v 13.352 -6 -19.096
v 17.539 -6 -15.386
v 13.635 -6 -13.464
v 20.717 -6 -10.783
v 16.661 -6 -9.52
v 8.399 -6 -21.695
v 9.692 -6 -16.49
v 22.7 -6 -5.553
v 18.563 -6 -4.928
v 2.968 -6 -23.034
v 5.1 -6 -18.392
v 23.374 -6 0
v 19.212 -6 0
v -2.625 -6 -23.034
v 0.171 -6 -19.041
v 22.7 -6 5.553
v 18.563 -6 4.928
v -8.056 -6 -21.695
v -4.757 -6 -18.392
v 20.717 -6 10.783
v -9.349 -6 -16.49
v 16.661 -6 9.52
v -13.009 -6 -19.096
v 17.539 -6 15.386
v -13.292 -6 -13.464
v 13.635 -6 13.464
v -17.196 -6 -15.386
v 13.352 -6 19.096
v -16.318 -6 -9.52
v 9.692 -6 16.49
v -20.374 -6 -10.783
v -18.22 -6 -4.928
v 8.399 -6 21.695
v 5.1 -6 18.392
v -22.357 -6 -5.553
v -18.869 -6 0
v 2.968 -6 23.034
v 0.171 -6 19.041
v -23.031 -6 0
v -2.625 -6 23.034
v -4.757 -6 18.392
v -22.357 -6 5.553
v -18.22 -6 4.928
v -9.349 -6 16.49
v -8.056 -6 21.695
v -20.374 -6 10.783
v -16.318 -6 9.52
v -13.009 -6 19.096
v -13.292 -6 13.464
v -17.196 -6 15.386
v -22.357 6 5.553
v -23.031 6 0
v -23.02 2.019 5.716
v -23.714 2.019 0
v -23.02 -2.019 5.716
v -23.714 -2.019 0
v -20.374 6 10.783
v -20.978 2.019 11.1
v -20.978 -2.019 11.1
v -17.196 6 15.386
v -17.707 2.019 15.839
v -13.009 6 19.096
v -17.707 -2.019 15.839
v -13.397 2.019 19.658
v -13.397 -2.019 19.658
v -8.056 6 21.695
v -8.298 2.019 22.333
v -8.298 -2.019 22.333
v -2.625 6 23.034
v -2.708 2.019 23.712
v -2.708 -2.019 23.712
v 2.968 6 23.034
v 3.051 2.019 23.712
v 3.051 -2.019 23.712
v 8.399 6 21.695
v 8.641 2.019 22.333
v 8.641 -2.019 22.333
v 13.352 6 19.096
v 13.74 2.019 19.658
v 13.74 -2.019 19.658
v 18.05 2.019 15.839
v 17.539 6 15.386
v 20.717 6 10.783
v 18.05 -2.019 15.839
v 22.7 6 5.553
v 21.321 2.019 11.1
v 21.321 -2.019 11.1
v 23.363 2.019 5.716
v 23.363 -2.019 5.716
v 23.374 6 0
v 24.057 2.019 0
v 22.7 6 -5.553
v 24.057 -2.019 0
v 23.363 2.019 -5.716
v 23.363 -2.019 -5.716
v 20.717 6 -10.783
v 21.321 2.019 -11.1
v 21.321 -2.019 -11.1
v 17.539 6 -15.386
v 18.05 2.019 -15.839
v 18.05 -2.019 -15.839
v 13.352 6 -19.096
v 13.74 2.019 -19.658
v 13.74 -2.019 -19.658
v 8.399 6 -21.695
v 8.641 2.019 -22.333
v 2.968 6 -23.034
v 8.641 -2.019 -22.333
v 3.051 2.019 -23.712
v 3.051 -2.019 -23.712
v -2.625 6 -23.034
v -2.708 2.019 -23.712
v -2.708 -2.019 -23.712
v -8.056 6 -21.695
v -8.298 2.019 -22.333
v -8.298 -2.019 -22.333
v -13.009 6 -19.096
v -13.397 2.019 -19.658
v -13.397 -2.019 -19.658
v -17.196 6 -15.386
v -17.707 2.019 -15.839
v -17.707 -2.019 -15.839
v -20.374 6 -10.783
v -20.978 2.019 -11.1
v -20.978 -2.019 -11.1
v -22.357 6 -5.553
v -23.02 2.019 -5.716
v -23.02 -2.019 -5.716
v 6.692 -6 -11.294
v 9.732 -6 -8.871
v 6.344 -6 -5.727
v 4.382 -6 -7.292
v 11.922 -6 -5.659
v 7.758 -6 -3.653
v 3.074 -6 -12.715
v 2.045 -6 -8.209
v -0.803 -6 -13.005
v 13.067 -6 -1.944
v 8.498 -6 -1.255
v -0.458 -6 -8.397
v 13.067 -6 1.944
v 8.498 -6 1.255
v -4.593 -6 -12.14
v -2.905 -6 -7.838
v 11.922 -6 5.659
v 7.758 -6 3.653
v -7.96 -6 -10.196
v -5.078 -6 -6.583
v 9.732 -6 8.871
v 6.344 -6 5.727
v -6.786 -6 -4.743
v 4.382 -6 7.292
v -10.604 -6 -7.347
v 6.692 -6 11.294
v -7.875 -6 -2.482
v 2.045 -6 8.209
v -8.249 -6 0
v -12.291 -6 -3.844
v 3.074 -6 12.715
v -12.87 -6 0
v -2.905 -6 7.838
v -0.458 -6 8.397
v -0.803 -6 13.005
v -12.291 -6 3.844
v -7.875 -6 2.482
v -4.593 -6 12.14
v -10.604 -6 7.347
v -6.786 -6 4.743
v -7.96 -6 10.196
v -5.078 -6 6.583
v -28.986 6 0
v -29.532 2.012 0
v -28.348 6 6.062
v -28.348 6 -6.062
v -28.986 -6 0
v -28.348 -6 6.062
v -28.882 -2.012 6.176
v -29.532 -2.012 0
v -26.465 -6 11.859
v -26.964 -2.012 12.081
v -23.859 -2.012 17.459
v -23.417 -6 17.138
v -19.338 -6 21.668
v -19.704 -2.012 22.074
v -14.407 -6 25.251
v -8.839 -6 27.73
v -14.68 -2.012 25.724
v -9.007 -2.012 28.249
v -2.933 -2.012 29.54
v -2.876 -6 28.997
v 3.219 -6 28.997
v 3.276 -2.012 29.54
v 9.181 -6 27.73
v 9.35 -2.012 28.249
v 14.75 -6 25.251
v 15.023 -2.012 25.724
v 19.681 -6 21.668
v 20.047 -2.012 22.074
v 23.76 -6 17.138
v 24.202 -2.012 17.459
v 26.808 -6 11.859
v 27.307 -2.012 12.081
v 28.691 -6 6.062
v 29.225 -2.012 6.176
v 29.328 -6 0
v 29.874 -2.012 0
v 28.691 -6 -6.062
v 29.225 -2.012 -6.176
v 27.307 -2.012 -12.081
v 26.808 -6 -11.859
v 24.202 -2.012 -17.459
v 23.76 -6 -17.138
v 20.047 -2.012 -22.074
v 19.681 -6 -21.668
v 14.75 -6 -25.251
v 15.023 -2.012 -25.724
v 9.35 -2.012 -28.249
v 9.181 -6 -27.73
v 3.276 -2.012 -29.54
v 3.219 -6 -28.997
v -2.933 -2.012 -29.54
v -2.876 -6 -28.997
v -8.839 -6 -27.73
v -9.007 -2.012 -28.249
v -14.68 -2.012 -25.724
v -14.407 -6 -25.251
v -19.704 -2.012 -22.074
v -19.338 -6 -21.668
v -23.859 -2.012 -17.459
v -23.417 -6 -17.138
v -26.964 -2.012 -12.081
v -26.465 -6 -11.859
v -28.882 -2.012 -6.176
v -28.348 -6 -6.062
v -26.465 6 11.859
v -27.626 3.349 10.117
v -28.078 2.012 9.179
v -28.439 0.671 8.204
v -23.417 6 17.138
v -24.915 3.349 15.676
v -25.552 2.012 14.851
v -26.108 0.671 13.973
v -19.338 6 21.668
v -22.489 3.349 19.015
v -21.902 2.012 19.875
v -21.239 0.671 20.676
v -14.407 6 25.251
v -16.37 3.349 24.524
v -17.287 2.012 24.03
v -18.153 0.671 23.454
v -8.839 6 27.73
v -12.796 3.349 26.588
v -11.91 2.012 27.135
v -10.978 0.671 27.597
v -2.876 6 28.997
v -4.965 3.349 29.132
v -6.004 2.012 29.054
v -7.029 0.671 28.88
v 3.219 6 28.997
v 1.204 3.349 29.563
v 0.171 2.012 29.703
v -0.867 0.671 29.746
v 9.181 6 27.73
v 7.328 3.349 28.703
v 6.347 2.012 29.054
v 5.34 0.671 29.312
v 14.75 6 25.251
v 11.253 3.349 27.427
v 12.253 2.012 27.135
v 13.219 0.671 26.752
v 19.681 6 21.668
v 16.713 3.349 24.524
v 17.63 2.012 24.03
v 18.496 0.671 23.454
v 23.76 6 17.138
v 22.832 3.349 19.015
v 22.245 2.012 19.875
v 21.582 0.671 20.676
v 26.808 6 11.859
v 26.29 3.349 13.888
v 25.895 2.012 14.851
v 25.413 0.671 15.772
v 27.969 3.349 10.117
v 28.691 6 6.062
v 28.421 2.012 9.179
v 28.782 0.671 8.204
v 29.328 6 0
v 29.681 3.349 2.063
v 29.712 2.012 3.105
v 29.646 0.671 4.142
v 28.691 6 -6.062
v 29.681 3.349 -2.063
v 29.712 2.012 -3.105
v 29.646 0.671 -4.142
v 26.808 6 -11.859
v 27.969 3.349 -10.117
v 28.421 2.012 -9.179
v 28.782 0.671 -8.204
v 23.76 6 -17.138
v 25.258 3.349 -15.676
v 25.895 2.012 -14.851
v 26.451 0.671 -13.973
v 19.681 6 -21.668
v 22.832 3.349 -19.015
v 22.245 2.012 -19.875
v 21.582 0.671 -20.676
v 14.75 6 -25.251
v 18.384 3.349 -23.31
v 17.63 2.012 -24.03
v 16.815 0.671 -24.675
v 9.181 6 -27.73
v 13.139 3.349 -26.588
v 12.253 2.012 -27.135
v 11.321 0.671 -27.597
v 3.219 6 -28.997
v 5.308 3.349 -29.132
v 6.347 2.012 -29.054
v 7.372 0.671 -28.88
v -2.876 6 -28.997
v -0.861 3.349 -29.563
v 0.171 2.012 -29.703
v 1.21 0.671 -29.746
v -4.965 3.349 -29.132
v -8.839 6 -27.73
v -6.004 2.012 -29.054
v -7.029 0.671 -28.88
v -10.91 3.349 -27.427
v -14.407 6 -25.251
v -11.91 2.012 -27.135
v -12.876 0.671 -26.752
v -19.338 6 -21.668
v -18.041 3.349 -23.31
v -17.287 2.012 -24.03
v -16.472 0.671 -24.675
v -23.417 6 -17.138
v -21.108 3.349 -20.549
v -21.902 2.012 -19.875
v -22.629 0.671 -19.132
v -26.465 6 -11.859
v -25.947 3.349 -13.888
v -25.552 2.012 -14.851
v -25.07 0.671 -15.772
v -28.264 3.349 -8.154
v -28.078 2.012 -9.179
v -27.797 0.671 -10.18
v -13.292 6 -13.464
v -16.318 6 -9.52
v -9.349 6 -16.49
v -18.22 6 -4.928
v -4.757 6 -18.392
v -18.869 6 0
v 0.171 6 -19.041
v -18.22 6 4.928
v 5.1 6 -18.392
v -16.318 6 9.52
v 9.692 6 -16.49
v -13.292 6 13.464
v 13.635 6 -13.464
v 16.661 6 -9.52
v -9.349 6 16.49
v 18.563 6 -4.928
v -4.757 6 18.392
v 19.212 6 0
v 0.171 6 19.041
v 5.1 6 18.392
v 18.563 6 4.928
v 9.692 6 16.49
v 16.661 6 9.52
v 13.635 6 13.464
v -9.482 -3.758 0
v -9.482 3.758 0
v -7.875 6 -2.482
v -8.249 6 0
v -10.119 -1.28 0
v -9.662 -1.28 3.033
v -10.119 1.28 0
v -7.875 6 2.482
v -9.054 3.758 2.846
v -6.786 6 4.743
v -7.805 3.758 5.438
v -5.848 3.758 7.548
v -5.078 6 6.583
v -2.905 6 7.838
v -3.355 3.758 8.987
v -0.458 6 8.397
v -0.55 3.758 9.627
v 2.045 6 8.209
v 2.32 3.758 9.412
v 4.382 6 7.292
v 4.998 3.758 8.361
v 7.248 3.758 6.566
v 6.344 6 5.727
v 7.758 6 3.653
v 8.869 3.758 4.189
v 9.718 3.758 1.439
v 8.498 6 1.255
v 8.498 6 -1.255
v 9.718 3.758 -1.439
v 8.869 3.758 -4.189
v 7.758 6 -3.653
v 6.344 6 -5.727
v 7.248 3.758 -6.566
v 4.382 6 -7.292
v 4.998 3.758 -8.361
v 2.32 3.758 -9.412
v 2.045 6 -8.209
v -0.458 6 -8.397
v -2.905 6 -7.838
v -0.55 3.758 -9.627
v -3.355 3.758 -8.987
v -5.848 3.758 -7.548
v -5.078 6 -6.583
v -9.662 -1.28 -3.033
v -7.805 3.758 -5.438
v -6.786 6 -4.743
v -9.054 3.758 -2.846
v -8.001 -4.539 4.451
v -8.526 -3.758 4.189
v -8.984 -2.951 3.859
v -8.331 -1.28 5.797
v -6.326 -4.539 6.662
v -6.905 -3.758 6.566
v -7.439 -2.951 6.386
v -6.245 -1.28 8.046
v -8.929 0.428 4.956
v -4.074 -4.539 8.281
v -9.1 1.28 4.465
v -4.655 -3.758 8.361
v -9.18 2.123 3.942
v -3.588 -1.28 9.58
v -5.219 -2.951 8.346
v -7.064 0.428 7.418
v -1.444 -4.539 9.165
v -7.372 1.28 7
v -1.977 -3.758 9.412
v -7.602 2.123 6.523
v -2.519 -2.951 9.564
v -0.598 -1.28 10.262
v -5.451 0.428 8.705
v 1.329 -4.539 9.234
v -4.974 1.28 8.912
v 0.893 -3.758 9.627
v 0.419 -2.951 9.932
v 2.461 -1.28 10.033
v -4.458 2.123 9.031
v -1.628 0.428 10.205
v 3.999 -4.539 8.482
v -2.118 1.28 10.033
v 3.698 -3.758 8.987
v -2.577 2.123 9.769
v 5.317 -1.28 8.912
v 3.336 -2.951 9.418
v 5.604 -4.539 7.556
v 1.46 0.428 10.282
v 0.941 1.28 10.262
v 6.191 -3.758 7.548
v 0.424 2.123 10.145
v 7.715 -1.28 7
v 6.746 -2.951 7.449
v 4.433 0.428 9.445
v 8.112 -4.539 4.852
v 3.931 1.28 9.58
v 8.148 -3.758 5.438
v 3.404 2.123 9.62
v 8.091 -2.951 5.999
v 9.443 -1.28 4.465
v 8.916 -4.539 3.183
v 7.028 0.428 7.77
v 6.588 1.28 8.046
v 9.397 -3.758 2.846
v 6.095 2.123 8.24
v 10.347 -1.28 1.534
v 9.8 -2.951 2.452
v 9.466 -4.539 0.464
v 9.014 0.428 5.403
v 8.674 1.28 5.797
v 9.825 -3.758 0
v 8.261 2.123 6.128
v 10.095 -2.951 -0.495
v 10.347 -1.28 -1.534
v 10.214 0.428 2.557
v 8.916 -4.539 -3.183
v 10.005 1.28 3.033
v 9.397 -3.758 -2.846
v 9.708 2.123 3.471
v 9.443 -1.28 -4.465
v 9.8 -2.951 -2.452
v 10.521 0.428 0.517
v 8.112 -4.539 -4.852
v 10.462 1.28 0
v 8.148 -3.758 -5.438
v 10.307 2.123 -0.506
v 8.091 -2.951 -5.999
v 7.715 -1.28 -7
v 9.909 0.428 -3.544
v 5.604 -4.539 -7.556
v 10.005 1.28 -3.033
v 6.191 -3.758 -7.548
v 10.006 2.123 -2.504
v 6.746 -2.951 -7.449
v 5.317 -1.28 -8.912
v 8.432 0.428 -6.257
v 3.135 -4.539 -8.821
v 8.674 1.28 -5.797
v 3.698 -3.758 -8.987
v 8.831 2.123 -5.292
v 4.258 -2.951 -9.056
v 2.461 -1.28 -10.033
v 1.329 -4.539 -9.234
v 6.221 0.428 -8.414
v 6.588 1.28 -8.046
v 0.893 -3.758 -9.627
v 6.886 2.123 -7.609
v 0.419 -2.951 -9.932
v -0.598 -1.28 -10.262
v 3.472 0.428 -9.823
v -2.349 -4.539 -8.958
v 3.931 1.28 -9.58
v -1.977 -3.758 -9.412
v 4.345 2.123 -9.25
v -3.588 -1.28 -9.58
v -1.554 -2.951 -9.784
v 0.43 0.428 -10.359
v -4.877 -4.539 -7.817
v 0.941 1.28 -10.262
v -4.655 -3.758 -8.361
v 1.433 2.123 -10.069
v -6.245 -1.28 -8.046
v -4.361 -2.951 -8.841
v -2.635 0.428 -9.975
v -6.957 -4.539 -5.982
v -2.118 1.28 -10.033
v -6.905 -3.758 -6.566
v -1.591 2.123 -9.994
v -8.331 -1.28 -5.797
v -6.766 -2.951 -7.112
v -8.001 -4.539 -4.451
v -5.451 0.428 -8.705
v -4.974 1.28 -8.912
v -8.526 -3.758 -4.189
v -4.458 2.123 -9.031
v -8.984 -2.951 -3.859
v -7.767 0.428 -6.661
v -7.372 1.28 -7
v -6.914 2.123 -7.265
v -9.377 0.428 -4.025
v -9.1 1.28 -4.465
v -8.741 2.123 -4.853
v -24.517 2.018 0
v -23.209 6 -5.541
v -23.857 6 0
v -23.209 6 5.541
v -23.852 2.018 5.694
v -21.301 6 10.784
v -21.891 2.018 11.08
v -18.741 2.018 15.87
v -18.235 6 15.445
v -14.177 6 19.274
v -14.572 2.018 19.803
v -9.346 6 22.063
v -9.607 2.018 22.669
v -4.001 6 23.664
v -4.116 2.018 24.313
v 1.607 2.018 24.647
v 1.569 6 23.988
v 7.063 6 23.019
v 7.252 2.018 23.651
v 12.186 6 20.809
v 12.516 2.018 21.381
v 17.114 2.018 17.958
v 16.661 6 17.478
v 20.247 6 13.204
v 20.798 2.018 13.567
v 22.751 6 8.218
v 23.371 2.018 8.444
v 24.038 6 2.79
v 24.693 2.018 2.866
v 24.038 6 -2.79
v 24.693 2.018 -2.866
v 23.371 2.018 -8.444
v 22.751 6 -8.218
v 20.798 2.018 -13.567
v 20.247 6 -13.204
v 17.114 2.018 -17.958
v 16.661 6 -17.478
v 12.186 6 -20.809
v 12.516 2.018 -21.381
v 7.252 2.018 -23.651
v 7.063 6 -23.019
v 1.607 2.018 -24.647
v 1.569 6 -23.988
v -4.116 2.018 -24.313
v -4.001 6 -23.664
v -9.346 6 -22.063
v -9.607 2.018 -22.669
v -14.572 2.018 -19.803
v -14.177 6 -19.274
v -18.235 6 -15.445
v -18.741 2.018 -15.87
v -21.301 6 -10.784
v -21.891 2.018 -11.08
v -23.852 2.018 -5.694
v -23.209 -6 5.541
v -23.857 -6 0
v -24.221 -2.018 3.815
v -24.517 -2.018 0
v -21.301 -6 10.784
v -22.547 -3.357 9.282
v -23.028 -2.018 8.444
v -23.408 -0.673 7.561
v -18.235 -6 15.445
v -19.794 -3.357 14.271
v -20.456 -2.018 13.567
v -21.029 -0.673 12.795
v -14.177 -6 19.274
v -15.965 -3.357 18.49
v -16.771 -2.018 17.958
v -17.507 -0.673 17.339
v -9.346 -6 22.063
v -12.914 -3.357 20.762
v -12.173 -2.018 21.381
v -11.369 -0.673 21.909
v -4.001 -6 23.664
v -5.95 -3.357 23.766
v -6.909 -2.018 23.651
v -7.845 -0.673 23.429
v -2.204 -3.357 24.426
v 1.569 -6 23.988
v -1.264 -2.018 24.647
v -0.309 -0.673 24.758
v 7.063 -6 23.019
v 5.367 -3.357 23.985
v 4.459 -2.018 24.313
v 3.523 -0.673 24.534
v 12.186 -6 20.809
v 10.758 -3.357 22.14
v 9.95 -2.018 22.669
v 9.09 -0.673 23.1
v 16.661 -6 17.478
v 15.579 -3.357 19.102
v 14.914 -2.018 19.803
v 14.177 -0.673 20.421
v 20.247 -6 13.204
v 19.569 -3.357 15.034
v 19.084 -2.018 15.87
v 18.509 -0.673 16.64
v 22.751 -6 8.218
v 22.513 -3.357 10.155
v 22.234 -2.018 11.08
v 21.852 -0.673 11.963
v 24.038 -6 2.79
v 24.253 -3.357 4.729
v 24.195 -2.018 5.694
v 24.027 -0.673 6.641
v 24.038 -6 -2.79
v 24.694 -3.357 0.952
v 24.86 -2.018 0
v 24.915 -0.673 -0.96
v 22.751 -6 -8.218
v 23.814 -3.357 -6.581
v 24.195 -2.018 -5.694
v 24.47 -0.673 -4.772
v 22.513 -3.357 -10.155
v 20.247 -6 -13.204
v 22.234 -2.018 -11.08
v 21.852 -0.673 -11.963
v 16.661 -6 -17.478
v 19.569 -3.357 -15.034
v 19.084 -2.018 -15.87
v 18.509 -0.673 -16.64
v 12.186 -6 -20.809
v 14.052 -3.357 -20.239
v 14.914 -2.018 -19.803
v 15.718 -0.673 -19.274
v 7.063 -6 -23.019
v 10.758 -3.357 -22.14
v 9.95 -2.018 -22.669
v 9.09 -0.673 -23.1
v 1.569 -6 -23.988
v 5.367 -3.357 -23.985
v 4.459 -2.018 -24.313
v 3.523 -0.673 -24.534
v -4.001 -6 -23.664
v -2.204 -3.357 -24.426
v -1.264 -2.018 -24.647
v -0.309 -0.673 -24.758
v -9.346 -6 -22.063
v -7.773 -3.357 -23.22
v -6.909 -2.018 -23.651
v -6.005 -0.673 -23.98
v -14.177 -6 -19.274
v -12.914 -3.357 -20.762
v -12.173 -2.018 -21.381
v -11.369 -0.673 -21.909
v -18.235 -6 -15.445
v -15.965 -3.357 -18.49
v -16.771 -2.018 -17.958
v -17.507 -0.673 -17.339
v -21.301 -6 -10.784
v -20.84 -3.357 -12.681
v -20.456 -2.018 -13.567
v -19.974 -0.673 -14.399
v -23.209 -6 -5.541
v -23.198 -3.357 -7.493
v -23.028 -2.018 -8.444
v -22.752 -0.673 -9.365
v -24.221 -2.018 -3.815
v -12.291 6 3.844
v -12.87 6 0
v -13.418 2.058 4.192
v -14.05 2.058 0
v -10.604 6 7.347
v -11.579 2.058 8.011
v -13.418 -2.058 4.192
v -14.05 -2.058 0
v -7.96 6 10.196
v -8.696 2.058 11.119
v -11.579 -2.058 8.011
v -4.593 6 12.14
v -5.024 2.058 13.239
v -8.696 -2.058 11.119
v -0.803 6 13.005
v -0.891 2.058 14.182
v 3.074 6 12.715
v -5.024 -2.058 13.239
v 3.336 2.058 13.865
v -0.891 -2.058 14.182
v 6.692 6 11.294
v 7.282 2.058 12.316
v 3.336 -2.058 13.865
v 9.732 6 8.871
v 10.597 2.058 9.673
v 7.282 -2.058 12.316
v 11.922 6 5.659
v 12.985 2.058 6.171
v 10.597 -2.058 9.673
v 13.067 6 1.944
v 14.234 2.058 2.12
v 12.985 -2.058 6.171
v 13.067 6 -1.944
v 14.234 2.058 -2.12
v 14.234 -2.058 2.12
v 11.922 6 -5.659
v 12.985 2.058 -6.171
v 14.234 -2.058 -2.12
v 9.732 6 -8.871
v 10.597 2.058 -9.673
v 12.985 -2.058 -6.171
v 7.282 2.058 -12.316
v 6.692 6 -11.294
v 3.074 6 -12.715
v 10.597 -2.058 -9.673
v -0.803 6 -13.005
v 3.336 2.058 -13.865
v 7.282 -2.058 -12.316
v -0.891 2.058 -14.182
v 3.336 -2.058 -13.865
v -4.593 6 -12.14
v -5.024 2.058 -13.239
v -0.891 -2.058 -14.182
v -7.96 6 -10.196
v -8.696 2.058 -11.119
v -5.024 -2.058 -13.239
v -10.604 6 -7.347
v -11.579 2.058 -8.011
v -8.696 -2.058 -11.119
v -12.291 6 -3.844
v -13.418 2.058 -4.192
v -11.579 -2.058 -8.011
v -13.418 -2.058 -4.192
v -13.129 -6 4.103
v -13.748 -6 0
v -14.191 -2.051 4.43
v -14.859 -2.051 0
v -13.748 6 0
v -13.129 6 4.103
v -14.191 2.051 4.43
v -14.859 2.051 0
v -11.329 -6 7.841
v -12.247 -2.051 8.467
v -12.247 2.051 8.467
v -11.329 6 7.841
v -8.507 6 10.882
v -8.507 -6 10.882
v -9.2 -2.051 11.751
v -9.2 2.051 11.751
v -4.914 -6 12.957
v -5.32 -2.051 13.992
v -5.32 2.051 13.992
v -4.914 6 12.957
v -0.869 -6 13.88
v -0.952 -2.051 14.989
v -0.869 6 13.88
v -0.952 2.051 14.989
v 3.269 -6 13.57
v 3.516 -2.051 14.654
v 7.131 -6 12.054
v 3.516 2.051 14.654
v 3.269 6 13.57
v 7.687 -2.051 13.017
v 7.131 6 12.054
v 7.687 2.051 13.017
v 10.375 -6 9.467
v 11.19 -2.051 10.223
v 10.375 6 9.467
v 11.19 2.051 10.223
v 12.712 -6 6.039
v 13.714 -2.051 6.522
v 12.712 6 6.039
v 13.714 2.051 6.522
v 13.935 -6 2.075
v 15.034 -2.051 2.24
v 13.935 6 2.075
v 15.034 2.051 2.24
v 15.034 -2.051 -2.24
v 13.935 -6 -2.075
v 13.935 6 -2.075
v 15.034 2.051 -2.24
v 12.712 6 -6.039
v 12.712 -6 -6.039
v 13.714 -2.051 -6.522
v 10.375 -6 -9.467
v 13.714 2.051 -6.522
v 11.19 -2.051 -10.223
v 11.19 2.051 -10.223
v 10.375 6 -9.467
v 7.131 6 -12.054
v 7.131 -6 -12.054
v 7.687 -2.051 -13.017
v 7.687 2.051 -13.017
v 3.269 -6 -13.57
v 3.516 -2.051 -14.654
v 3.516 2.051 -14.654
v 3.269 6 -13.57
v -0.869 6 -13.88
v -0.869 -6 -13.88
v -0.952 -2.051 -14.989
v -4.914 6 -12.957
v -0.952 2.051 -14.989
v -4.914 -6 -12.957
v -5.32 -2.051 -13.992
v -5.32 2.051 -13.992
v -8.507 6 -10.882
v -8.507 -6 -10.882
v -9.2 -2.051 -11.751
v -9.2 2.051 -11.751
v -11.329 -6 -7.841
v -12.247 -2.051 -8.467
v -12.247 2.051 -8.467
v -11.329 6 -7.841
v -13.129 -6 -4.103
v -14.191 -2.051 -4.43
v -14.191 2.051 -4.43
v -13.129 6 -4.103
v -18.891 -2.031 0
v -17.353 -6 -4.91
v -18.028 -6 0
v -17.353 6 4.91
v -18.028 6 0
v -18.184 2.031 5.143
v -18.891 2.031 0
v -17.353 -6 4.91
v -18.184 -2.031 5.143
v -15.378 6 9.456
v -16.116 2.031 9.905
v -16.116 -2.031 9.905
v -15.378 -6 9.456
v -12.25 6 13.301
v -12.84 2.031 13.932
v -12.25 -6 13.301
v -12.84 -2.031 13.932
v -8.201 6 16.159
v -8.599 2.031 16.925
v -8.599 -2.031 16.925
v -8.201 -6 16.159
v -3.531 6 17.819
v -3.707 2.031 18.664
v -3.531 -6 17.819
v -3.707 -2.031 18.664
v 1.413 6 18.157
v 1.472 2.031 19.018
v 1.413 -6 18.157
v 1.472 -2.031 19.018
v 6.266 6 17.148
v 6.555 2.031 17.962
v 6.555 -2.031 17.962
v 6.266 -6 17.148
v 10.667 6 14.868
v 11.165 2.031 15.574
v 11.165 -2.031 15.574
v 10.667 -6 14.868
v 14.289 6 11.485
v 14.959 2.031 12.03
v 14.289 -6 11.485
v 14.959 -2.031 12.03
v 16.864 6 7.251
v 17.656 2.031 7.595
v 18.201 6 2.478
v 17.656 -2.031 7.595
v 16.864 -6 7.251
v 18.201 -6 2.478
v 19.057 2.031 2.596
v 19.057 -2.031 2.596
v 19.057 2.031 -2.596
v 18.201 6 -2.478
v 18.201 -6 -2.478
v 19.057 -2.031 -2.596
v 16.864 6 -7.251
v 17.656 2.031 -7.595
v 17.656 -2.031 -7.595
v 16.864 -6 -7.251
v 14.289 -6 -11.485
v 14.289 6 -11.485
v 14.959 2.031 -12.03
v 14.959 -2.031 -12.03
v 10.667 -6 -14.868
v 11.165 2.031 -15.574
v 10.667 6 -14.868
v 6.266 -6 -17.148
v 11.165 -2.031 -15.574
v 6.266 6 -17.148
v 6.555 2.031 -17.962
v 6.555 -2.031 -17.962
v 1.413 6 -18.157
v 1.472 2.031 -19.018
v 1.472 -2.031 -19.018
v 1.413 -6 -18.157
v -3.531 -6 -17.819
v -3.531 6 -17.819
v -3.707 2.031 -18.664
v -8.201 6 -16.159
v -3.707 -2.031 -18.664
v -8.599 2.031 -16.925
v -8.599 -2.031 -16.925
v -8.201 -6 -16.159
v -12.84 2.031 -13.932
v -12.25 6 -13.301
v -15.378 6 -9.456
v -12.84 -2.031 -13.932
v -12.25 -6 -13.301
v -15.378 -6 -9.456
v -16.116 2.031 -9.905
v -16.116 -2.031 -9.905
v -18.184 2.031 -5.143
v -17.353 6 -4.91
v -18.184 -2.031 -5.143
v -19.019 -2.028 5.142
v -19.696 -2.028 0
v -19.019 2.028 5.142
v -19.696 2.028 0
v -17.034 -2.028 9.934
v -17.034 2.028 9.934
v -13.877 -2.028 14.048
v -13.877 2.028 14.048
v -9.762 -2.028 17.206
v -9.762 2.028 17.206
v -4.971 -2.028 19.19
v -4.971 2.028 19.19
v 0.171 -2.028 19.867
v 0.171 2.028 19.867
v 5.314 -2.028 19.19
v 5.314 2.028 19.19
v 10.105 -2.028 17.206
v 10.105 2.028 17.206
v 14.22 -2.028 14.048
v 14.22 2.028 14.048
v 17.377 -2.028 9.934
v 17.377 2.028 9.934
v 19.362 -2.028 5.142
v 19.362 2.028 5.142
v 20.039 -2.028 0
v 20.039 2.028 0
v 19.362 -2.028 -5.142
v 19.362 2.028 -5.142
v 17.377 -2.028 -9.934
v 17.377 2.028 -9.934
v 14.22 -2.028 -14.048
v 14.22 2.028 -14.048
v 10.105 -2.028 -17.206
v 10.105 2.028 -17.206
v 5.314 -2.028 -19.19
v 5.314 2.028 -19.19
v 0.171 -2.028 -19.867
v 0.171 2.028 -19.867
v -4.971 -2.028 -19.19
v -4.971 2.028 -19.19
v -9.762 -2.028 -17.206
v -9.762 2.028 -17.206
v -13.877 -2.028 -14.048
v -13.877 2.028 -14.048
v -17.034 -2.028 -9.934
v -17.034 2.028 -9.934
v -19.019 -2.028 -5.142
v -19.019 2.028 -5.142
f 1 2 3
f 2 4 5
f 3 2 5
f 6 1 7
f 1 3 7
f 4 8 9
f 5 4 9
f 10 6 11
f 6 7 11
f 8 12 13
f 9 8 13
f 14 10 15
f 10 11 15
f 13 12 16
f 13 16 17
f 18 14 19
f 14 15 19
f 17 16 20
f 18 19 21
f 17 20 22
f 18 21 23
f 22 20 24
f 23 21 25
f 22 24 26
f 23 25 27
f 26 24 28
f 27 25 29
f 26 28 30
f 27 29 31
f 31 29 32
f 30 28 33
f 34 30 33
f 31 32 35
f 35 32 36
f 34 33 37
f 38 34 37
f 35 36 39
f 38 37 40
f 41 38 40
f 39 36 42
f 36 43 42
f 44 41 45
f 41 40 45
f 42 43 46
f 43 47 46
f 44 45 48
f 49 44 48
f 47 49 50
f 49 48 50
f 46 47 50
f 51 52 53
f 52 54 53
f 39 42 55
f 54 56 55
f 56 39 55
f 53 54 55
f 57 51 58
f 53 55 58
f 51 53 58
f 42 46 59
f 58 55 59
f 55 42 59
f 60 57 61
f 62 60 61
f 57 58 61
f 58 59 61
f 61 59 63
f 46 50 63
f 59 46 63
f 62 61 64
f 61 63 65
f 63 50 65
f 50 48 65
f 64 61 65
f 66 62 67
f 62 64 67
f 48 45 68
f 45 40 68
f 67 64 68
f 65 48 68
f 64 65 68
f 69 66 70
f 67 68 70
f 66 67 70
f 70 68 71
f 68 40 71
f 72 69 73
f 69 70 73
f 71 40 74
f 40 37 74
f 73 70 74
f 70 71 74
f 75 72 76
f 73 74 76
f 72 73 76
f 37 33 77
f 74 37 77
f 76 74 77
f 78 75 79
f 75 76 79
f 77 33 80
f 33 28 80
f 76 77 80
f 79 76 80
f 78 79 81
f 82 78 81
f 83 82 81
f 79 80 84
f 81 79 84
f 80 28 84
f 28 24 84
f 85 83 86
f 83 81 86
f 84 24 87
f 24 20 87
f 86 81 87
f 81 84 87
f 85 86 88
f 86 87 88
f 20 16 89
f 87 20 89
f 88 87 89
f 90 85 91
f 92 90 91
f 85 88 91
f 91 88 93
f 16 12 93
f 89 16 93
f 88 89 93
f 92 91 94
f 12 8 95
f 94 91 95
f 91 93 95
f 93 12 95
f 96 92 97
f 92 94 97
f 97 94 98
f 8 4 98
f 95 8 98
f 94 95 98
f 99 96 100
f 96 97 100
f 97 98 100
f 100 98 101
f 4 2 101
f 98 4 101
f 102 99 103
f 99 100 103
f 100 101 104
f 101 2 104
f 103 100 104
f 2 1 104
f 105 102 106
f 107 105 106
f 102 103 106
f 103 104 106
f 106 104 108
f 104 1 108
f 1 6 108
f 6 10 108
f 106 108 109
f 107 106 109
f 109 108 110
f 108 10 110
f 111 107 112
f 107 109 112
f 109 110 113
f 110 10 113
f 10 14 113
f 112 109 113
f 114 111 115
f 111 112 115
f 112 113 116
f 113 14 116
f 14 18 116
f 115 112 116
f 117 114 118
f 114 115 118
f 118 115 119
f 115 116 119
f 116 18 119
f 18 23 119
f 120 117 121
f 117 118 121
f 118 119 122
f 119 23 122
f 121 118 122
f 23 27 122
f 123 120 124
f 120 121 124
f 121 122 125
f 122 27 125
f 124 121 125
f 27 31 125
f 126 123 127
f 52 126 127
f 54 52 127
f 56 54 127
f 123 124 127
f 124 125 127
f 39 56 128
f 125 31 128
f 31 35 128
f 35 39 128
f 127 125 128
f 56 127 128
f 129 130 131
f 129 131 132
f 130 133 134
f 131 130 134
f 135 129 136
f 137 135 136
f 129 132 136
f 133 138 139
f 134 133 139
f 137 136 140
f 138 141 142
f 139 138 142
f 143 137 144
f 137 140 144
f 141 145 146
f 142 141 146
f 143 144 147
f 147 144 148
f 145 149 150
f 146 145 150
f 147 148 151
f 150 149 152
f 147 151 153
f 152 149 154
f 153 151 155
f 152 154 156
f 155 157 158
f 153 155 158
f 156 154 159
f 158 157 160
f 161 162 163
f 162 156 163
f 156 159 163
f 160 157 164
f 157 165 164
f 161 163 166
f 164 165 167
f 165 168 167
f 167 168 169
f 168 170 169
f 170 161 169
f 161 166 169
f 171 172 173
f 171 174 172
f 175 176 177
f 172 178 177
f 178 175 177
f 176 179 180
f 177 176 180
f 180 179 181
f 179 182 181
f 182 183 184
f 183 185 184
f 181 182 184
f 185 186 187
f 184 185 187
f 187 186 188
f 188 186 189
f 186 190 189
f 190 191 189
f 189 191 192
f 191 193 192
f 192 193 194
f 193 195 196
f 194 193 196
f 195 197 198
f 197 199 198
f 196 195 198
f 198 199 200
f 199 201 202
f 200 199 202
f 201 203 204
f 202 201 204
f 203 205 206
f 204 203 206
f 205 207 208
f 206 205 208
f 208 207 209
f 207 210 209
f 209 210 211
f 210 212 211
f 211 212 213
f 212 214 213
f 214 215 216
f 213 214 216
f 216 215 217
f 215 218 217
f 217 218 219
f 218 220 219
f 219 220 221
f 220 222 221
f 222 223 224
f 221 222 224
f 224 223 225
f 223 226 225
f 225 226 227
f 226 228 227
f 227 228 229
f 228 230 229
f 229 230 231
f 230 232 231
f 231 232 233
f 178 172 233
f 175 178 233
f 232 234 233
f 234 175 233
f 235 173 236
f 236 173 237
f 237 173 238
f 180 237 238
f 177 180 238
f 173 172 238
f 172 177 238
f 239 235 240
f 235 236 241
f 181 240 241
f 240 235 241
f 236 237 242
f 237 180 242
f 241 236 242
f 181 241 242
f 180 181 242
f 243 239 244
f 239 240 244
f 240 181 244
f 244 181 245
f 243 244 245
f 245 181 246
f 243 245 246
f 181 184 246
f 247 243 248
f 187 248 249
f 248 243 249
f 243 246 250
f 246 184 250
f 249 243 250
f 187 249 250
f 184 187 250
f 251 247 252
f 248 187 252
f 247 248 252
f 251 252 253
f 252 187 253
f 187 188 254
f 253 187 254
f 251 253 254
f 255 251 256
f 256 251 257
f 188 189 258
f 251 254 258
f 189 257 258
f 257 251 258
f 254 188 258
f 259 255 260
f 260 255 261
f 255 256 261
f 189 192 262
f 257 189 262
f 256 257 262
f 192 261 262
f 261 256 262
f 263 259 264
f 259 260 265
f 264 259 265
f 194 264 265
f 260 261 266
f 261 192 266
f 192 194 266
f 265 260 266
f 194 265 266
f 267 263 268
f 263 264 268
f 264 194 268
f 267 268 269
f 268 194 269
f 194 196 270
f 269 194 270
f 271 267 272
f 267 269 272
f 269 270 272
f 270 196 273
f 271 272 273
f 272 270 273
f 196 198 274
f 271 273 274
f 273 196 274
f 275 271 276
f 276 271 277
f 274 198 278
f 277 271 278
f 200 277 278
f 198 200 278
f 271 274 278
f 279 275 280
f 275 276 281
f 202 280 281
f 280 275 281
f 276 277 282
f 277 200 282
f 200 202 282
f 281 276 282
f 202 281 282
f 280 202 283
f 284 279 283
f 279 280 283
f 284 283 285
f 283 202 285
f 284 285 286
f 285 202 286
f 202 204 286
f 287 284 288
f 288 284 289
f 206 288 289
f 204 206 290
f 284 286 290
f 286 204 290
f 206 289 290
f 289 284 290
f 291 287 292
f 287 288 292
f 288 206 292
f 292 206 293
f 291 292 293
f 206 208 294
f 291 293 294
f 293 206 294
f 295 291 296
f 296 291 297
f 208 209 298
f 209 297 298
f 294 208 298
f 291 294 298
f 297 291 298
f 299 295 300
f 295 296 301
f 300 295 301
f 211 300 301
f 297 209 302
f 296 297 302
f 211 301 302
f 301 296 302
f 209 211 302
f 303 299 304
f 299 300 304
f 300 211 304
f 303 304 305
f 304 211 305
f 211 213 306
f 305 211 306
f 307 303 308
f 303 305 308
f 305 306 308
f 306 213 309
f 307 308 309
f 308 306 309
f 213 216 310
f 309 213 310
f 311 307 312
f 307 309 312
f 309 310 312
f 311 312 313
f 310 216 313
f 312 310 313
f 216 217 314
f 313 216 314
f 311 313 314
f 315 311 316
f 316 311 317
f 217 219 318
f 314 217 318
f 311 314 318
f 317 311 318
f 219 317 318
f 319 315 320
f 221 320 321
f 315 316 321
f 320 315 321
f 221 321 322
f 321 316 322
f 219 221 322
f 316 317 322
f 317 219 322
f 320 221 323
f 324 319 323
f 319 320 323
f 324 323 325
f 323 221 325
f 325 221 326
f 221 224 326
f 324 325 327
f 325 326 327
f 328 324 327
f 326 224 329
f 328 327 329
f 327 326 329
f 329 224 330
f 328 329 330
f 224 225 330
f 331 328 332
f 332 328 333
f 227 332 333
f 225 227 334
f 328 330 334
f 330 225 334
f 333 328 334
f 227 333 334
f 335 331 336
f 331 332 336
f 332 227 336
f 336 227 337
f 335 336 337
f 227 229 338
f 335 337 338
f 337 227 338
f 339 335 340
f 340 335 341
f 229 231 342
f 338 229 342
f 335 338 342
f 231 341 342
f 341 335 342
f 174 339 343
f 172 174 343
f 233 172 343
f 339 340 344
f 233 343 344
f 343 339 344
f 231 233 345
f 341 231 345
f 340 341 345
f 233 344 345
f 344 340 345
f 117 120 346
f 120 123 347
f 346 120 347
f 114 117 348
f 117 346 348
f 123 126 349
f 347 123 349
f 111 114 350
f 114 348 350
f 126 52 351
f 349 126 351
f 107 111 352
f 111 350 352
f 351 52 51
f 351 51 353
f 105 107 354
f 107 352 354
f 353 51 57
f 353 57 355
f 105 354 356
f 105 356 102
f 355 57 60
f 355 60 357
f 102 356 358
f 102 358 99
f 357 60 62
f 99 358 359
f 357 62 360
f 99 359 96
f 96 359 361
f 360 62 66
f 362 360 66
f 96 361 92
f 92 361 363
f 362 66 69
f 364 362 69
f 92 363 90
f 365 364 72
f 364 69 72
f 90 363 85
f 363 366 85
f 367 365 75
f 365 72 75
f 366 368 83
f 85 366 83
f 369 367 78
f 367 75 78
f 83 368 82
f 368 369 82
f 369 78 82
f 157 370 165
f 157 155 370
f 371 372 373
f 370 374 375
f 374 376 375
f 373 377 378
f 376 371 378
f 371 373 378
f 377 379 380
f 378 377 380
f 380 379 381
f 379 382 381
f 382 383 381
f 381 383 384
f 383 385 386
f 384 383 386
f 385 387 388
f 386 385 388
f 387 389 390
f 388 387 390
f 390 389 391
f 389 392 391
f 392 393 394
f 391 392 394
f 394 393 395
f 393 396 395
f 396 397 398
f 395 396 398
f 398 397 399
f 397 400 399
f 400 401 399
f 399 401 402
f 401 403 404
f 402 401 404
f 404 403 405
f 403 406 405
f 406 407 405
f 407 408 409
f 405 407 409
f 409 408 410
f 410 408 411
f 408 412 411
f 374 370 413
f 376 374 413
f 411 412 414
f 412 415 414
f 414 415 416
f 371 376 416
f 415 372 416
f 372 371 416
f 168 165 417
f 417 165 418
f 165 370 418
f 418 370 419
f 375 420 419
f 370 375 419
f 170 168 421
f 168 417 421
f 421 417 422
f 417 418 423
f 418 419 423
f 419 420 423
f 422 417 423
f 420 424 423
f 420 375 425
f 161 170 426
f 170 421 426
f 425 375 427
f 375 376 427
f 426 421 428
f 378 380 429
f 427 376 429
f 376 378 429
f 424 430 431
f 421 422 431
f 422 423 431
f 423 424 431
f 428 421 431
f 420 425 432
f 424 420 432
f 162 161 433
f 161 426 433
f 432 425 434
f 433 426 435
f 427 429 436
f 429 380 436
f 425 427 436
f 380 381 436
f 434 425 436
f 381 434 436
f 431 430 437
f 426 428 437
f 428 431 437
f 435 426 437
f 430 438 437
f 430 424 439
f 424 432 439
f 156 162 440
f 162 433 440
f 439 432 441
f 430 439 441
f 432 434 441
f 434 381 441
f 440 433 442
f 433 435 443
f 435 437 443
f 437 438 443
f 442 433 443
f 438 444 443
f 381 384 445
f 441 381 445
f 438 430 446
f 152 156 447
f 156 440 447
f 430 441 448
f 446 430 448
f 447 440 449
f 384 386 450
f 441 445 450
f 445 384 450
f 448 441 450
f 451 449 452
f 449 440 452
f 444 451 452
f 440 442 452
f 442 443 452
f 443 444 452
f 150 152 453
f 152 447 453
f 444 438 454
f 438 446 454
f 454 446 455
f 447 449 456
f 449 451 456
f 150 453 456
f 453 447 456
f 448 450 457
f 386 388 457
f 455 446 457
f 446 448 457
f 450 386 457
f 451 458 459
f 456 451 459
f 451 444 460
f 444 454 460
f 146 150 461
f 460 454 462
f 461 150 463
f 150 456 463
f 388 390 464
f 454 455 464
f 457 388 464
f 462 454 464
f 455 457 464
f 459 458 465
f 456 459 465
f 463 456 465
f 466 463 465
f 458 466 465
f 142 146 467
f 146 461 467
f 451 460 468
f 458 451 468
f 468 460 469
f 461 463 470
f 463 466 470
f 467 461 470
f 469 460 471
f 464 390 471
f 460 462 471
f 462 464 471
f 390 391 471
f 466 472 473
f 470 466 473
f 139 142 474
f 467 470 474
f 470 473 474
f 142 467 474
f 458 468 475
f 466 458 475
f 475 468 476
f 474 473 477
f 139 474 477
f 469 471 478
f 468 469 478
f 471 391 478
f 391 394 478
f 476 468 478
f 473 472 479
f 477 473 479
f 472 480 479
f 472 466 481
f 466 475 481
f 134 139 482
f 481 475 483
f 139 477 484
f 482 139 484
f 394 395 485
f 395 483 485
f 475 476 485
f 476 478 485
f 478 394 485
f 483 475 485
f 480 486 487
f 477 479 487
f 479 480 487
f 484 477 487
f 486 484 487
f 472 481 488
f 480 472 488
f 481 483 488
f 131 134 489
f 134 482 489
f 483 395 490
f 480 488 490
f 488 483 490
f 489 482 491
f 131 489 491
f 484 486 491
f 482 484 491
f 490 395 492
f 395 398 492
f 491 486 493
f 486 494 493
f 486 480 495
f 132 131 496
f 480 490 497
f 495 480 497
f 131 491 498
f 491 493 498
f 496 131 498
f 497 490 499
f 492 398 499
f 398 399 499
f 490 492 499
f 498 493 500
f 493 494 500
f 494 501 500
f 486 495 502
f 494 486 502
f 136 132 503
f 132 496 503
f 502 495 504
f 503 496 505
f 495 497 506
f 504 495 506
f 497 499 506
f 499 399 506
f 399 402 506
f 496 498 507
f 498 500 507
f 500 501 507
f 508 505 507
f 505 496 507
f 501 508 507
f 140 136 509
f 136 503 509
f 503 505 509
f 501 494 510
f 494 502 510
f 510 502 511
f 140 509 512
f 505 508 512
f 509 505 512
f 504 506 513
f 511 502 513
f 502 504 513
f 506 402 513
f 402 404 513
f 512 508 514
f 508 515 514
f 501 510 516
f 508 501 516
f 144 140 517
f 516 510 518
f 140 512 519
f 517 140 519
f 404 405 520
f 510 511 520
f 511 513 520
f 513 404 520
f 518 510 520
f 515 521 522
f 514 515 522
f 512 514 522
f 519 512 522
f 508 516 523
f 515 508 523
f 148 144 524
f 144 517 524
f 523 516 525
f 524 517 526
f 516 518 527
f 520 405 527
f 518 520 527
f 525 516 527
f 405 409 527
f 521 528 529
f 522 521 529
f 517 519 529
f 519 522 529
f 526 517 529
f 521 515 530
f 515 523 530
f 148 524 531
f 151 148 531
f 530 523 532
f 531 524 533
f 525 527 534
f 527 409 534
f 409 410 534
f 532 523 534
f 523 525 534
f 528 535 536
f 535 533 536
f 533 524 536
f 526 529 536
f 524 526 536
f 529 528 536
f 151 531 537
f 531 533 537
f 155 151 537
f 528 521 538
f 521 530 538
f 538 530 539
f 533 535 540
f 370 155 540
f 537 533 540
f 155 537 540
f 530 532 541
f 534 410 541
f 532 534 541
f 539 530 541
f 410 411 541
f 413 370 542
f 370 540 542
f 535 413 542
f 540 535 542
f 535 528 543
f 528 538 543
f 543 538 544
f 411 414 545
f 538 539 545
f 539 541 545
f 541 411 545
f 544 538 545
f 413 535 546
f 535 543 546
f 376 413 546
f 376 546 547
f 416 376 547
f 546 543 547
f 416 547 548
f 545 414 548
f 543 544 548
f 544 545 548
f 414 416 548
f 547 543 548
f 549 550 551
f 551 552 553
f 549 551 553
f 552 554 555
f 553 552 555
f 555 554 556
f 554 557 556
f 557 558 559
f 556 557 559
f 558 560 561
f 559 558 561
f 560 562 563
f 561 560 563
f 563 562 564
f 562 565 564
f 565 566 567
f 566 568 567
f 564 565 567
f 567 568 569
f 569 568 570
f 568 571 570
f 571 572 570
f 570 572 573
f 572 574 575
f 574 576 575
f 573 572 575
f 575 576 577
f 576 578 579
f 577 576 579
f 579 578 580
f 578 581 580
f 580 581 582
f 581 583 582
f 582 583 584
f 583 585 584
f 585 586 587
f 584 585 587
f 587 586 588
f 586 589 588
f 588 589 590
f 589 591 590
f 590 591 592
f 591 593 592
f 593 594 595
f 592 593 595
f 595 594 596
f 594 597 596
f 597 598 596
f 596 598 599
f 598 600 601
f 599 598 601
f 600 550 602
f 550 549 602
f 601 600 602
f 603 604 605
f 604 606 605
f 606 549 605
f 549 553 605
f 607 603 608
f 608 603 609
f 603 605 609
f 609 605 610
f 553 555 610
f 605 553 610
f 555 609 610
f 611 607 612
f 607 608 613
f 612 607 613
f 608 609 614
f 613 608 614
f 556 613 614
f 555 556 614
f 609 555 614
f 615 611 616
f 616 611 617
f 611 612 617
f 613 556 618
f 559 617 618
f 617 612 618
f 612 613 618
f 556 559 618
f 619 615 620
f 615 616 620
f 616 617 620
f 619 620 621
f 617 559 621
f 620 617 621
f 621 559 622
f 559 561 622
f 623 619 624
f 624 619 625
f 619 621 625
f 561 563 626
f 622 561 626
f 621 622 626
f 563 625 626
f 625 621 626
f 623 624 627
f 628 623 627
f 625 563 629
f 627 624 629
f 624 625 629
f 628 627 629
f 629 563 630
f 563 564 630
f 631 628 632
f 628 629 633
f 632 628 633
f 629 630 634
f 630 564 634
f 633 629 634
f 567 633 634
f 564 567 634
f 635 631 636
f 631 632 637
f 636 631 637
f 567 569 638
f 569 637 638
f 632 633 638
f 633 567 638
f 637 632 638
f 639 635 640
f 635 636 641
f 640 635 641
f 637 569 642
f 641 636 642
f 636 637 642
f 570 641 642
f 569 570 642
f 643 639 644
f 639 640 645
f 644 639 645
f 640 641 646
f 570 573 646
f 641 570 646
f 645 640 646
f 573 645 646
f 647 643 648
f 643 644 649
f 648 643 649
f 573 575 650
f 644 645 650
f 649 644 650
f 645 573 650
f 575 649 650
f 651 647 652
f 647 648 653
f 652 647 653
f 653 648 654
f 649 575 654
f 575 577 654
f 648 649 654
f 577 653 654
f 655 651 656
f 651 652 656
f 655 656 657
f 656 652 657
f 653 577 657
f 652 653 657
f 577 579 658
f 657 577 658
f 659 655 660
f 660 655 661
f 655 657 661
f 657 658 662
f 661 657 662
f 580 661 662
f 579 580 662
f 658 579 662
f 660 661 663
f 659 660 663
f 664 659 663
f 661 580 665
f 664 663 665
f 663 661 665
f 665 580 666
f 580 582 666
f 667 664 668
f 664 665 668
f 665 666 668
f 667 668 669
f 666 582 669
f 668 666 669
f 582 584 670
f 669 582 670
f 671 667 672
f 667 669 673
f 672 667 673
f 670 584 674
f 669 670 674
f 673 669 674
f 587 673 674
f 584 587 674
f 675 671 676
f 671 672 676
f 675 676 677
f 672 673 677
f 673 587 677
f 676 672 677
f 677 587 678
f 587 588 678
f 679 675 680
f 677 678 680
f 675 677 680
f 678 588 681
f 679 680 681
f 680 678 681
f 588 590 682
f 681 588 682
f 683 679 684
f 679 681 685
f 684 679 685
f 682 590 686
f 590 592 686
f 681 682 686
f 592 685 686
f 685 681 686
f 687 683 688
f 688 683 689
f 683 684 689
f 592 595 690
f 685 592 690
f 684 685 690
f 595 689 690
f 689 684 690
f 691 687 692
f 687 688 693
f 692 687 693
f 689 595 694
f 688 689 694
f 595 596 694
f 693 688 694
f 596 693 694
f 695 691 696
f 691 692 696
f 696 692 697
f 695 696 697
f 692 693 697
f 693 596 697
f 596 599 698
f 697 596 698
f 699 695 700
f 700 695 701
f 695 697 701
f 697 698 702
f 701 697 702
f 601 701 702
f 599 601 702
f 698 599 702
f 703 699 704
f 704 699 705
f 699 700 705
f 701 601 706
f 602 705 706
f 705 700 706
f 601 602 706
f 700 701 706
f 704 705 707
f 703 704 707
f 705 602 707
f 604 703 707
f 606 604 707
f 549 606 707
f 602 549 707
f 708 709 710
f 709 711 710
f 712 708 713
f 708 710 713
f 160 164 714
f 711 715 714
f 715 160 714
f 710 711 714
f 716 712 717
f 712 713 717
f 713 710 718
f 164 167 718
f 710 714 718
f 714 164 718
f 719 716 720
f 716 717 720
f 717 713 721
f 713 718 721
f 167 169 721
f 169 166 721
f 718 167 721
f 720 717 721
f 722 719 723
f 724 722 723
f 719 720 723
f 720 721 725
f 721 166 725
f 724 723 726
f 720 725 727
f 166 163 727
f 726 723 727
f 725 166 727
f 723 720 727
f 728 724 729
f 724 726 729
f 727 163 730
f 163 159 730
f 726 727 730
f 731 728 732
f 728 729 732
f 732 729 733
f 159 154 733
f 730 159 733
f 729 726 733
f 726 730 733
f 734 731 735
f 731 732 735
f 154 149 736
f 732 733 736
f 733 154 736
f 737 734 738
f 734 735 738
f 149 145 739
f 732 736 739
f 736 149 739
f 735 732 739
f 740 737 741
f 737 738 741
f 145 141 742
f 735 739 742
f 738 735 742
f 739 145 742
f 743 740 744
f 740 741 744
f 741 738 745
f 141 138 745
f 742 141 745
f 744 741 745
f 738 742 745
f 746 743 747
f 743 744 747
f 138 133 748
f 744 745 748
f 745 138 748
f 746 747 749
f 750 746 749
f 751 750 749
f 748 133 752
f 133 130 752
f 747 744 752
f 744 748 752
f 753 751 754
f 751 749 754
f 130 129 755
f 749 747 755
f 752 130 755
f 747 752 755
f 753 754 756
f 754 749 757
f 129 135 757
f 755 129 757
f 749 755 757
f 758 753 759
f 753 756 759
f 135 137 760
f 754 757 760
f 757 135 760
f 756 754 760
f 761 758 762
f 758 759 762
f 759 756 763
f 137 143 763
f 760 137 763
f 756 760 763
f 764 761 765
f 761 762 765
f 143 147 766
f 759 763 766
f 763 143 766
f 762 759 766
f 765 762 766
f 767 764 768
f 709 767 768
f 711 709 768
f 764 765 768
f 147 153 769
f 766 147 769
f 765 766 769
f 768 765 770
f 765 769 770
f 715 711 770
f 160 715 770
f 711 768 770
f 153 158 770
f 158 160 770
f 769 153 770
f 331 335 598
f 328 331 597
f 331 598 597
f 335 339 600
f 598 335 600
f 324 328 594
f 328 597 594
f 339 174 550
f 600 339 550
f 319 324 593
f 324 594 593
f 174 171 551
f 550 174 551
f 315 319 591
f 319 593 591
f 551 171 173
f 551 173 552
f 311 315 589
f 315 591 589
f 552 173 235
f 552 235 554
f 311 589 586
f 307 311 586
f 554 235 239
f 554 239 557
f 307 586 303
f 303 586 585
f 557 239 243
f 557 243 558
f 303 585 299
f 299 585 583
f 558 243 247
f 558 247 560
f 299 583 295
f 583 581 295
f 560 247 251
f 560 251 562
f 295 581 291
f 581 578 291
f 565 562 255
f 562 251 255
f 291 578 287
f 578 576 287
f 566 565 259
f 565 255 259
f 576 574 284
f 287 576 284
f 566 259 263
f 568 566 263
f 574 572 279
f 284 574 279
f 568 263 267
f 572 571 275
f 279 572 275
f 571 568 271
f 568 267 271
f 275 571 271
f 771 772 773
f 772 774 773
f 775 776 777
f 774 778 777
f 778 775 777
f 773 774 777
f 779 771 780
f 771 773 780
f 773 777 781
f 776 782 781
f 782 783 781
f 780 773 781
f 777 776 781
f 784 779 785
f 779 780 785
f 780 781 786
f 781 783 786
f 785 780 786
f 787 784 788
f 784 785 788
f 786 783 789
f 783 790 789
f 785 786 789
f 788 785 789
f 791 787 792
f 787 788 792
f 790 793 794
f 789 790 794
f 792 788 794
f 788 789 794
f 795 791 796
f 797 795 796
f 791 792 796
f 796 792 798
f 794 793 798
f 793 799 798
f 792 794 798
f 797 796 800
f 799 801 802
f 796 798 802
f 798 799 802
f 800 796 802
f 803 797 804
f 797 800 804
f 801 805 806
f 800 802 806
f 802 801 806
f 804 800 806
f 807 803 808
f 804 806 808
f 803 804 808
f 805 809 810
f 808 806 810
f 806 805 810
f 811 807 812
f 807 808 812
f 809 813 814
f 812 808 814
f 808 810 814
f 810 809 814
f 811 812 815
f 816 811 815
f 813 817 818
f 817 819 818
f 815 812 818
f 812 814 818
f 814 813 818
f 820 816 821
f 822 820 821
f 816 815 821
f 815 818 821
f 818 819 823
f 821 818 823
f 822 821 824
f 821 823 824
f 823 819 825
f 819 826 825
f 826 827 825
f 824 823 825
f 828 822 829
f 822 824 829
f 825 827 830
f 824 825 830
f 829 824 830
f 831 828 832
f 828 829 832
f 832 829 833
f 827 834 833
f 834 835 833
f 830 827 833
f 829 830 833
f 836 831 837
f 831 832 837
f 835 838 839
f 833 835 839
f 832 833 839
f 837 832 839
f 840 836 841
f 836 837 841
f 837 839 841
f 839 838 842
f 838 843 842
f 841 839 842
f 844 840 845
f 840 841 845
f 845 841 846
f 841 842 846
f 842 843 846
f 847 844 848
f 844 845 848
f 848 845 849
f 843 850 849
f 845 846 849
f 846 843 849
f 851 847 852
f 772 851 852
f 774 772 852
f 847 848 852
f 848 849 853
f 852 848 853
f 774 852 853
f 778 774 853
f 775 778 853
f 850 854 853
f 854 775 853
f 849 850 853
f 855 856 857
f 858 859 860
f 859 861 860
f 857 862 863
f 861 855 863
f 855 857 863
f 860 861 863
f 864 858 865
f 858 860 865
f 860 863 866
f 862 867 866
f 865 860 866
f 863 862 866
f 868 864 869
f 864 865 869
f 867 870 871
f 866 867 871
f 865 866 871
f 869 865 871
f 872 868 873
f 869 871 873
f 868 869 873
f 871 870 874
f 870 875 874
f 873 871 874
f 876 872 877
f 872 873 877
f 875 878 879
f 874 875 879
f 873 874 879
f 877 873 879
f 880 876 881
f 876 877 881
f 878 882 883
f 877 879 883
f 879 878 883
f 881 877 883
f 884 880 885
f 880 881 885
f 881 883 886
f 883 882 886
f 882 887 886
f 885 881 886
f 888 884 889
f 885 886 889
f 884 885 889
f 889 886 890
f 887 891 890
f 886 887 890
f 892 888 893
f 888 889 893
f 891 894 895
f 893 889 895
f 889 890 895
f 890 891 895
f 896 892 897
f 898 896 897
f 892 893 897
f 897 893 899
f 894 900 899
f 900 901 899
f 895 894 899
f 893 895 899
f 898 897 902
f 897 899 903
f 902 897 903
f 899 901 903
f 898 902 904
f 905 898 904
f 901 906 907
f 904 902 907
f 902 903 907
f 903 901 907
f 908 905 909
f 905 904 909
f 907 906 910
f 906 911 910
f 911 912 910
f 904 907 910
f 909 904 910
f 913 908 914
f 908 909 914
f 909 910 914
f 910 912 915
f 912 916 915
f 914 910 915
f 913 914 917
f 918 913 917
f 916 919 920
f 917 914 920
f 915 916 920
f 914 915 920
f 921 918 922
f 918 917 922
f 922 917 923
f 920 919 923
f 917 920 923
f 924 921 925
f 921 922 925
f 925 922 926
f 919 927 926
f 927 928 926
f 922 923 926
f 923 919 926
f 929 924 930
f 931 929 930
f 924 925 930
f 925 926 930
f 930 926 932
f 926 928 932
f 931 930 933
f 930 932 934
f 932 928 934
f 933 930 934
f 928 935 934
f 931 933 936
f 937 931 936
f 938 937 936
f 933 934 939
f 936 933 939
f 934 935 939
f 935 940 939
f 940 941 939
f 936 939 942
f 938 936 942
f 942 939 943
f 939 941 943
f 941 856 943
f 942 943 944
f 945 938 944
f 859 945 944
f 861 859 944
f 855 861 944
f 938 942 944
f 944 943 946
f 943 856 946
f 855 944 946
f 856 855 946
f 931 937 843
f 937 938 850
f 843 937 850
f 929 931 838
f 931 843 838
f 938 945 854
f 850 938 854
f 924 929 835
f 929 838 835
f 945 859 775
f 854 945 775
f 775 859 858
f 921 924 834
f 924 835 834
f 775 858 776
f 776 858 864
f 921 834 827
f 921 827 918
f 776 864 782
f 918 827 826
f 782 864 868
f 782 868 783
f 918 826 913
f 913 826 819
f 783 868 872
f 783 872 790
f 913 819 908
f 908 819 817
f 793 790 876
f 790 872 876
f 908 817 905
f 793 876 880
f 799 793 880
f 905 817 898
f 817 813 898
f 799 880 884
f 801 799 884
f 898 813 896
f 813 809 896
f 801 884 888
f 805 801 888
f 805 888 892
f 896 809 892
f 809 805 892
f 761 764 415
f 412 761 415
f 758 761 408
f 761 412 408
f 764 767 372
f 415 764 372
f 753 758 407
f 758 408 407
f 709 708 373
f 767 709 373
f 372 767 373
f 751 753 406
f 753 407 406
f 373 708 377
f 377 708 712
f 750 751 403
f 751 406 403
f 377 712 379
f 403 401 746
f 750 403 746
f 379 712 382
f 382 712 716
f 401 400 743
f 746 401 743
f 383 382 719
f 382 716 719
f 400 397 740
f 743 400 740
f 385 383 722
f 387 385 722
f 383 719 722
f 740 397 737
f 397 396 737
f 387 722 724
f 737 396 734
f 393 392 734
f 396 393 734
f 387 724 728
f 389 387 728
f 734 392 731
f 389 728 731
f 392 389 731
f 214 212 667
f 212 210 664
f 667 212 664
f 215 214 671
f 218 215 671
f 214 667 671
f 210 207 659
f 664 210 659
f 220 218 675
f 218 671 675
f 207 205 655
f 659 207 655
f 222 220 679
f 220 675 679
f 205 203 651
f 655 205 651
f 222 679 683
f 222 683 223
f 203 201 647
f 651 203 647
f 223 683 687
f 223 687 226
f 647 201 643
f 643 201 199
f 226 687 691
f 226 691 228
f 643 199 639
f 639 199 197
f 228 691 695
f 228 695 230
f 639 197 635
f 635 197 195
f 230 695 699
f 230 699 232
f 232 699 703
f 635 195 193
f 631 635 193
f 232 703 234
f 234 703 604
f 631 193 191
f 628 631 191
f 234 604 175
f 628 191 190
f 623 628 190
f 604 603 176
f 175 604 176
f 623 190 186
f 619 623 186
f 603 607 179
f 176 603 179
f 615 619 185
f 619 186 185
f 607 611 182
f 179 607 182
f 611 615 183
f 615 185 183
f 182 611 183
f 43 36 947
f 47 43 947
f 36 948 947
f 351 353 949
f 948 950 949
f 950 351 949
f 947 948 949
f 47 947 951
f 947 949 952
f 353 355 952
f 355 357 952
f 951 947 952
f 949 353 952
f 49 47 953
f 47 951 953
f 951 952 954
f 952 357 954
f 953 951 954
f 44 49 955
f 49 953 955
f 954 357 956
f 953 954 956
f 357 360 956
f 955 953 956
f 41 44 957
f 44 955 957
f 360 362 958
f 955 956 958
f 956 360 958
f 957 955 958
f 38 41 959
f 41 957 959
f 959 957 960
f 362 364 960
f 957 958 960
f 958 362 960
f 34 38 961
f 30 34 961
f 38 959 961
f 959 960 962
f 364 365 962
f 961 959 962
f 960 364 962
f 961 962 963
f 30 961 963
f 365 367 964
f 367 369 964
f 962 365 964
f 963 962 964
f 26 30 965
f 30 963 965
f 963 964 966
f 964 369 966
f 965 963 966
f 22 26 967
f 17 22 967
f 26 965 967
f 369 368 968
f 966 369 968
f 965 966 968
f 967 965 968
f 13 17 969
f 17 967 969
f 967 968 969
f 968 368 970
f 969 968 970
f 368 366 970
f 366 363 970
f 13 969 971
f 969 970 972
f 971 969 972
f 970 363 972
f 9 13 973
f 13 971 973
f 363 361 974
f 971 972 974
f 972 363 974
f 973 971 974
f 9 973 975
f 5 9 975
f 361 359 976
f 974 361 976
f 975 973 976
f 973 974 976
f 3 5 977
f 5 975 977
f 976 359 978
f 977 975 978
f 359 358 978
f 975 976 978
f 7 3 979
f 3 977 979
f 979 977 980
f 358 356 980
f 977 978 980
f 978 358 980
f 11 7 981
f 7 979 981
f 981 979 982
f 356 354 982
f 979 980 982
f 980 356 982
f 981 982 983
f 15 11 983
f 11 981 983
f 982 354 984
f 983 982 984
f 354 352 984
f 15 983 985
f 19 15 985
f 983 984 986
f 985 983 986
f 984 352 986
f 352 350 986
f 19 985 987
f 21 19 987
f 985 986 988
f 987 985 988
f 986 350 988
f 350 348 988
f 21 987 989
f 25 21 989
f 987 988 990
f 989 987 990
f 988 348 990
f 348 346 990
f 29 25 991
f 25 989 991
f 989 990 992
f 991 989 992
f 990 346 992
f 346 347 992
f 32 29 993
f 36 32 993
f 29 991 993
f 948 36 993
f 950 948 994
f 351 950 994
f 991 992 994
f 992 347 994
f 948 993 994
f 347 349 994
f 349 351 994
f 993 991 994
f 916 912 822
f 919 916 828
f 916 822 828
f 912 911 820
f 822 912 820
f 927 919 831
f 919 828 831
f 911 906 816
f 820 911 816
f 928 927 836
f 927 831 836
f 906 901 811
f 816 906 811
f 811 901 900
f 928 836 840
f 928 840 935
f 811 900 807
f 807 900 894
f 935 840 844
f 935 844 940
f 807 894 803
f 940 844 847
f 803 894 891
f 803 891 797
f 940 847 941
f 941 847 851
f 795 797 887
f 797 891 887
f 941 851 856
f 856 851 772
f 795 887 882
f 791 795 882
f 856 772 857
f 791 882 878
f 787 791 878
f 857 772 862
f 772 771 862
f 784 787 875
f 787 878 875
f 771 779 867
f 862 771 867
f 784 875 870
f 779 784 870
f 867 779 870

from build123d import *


with BuildPart() as f1:
    # F0 (on Top) → F1 (revolve)
    with BuildSketch(Plane.XY):
        with BuildLine():
            ThreePointArc((-23.857074, -6), (-24.6, 0), (-23.857074, 6))
            Line((-23.857074, 6), (-28.985514, 6))
            ThreePointArc((-28.985514, 6), (-29.6, 0), (-28.985514, -6))
            Line((-28.985514, -6), (-23.857074, -6))
        make_face()
        with BuildLine():
            ThreePointArc((-18.869022, -6), (-19.8, 0), (-18.869022, 6))
            Line((-18.869022, 6), (-23.031283, 6))
            ThreePointArc((-23.031283, 6), (-23.8, 0), (-23.031283, -6))
            Line((-23.031283, -6), (-18.869022, -6))
        make_face()
        with BuildLine():
            ThreePointArc((-13.747727, -6), (-15, 0), (-13.747727, 6))
            Line((-13.747727, 6), (-18.027756, 6))
            ThreePointArc((-18.027756, 6), (-19, 0), (-18.027756, -6))
            Line((-18.027756, -6), (-13.747727, -6))
        make_face()
        with BuildLine():
            Line((-8.248636, 6), (-12.87012, 6))
            ThreePointArc((-12.87012, 6), (-14.2, 0), (-12.87012, -6))
            Line((-12.87012, -6), (-8.248636, -6))
            ThreePointArc((-8.248636, -6), (-10.2, 0), (-8.248636, 6))
        make_face()
    revolve(axis=Axis((0.171485, 0.5, 0), (0, 1, 0)))


solid = f1.part
